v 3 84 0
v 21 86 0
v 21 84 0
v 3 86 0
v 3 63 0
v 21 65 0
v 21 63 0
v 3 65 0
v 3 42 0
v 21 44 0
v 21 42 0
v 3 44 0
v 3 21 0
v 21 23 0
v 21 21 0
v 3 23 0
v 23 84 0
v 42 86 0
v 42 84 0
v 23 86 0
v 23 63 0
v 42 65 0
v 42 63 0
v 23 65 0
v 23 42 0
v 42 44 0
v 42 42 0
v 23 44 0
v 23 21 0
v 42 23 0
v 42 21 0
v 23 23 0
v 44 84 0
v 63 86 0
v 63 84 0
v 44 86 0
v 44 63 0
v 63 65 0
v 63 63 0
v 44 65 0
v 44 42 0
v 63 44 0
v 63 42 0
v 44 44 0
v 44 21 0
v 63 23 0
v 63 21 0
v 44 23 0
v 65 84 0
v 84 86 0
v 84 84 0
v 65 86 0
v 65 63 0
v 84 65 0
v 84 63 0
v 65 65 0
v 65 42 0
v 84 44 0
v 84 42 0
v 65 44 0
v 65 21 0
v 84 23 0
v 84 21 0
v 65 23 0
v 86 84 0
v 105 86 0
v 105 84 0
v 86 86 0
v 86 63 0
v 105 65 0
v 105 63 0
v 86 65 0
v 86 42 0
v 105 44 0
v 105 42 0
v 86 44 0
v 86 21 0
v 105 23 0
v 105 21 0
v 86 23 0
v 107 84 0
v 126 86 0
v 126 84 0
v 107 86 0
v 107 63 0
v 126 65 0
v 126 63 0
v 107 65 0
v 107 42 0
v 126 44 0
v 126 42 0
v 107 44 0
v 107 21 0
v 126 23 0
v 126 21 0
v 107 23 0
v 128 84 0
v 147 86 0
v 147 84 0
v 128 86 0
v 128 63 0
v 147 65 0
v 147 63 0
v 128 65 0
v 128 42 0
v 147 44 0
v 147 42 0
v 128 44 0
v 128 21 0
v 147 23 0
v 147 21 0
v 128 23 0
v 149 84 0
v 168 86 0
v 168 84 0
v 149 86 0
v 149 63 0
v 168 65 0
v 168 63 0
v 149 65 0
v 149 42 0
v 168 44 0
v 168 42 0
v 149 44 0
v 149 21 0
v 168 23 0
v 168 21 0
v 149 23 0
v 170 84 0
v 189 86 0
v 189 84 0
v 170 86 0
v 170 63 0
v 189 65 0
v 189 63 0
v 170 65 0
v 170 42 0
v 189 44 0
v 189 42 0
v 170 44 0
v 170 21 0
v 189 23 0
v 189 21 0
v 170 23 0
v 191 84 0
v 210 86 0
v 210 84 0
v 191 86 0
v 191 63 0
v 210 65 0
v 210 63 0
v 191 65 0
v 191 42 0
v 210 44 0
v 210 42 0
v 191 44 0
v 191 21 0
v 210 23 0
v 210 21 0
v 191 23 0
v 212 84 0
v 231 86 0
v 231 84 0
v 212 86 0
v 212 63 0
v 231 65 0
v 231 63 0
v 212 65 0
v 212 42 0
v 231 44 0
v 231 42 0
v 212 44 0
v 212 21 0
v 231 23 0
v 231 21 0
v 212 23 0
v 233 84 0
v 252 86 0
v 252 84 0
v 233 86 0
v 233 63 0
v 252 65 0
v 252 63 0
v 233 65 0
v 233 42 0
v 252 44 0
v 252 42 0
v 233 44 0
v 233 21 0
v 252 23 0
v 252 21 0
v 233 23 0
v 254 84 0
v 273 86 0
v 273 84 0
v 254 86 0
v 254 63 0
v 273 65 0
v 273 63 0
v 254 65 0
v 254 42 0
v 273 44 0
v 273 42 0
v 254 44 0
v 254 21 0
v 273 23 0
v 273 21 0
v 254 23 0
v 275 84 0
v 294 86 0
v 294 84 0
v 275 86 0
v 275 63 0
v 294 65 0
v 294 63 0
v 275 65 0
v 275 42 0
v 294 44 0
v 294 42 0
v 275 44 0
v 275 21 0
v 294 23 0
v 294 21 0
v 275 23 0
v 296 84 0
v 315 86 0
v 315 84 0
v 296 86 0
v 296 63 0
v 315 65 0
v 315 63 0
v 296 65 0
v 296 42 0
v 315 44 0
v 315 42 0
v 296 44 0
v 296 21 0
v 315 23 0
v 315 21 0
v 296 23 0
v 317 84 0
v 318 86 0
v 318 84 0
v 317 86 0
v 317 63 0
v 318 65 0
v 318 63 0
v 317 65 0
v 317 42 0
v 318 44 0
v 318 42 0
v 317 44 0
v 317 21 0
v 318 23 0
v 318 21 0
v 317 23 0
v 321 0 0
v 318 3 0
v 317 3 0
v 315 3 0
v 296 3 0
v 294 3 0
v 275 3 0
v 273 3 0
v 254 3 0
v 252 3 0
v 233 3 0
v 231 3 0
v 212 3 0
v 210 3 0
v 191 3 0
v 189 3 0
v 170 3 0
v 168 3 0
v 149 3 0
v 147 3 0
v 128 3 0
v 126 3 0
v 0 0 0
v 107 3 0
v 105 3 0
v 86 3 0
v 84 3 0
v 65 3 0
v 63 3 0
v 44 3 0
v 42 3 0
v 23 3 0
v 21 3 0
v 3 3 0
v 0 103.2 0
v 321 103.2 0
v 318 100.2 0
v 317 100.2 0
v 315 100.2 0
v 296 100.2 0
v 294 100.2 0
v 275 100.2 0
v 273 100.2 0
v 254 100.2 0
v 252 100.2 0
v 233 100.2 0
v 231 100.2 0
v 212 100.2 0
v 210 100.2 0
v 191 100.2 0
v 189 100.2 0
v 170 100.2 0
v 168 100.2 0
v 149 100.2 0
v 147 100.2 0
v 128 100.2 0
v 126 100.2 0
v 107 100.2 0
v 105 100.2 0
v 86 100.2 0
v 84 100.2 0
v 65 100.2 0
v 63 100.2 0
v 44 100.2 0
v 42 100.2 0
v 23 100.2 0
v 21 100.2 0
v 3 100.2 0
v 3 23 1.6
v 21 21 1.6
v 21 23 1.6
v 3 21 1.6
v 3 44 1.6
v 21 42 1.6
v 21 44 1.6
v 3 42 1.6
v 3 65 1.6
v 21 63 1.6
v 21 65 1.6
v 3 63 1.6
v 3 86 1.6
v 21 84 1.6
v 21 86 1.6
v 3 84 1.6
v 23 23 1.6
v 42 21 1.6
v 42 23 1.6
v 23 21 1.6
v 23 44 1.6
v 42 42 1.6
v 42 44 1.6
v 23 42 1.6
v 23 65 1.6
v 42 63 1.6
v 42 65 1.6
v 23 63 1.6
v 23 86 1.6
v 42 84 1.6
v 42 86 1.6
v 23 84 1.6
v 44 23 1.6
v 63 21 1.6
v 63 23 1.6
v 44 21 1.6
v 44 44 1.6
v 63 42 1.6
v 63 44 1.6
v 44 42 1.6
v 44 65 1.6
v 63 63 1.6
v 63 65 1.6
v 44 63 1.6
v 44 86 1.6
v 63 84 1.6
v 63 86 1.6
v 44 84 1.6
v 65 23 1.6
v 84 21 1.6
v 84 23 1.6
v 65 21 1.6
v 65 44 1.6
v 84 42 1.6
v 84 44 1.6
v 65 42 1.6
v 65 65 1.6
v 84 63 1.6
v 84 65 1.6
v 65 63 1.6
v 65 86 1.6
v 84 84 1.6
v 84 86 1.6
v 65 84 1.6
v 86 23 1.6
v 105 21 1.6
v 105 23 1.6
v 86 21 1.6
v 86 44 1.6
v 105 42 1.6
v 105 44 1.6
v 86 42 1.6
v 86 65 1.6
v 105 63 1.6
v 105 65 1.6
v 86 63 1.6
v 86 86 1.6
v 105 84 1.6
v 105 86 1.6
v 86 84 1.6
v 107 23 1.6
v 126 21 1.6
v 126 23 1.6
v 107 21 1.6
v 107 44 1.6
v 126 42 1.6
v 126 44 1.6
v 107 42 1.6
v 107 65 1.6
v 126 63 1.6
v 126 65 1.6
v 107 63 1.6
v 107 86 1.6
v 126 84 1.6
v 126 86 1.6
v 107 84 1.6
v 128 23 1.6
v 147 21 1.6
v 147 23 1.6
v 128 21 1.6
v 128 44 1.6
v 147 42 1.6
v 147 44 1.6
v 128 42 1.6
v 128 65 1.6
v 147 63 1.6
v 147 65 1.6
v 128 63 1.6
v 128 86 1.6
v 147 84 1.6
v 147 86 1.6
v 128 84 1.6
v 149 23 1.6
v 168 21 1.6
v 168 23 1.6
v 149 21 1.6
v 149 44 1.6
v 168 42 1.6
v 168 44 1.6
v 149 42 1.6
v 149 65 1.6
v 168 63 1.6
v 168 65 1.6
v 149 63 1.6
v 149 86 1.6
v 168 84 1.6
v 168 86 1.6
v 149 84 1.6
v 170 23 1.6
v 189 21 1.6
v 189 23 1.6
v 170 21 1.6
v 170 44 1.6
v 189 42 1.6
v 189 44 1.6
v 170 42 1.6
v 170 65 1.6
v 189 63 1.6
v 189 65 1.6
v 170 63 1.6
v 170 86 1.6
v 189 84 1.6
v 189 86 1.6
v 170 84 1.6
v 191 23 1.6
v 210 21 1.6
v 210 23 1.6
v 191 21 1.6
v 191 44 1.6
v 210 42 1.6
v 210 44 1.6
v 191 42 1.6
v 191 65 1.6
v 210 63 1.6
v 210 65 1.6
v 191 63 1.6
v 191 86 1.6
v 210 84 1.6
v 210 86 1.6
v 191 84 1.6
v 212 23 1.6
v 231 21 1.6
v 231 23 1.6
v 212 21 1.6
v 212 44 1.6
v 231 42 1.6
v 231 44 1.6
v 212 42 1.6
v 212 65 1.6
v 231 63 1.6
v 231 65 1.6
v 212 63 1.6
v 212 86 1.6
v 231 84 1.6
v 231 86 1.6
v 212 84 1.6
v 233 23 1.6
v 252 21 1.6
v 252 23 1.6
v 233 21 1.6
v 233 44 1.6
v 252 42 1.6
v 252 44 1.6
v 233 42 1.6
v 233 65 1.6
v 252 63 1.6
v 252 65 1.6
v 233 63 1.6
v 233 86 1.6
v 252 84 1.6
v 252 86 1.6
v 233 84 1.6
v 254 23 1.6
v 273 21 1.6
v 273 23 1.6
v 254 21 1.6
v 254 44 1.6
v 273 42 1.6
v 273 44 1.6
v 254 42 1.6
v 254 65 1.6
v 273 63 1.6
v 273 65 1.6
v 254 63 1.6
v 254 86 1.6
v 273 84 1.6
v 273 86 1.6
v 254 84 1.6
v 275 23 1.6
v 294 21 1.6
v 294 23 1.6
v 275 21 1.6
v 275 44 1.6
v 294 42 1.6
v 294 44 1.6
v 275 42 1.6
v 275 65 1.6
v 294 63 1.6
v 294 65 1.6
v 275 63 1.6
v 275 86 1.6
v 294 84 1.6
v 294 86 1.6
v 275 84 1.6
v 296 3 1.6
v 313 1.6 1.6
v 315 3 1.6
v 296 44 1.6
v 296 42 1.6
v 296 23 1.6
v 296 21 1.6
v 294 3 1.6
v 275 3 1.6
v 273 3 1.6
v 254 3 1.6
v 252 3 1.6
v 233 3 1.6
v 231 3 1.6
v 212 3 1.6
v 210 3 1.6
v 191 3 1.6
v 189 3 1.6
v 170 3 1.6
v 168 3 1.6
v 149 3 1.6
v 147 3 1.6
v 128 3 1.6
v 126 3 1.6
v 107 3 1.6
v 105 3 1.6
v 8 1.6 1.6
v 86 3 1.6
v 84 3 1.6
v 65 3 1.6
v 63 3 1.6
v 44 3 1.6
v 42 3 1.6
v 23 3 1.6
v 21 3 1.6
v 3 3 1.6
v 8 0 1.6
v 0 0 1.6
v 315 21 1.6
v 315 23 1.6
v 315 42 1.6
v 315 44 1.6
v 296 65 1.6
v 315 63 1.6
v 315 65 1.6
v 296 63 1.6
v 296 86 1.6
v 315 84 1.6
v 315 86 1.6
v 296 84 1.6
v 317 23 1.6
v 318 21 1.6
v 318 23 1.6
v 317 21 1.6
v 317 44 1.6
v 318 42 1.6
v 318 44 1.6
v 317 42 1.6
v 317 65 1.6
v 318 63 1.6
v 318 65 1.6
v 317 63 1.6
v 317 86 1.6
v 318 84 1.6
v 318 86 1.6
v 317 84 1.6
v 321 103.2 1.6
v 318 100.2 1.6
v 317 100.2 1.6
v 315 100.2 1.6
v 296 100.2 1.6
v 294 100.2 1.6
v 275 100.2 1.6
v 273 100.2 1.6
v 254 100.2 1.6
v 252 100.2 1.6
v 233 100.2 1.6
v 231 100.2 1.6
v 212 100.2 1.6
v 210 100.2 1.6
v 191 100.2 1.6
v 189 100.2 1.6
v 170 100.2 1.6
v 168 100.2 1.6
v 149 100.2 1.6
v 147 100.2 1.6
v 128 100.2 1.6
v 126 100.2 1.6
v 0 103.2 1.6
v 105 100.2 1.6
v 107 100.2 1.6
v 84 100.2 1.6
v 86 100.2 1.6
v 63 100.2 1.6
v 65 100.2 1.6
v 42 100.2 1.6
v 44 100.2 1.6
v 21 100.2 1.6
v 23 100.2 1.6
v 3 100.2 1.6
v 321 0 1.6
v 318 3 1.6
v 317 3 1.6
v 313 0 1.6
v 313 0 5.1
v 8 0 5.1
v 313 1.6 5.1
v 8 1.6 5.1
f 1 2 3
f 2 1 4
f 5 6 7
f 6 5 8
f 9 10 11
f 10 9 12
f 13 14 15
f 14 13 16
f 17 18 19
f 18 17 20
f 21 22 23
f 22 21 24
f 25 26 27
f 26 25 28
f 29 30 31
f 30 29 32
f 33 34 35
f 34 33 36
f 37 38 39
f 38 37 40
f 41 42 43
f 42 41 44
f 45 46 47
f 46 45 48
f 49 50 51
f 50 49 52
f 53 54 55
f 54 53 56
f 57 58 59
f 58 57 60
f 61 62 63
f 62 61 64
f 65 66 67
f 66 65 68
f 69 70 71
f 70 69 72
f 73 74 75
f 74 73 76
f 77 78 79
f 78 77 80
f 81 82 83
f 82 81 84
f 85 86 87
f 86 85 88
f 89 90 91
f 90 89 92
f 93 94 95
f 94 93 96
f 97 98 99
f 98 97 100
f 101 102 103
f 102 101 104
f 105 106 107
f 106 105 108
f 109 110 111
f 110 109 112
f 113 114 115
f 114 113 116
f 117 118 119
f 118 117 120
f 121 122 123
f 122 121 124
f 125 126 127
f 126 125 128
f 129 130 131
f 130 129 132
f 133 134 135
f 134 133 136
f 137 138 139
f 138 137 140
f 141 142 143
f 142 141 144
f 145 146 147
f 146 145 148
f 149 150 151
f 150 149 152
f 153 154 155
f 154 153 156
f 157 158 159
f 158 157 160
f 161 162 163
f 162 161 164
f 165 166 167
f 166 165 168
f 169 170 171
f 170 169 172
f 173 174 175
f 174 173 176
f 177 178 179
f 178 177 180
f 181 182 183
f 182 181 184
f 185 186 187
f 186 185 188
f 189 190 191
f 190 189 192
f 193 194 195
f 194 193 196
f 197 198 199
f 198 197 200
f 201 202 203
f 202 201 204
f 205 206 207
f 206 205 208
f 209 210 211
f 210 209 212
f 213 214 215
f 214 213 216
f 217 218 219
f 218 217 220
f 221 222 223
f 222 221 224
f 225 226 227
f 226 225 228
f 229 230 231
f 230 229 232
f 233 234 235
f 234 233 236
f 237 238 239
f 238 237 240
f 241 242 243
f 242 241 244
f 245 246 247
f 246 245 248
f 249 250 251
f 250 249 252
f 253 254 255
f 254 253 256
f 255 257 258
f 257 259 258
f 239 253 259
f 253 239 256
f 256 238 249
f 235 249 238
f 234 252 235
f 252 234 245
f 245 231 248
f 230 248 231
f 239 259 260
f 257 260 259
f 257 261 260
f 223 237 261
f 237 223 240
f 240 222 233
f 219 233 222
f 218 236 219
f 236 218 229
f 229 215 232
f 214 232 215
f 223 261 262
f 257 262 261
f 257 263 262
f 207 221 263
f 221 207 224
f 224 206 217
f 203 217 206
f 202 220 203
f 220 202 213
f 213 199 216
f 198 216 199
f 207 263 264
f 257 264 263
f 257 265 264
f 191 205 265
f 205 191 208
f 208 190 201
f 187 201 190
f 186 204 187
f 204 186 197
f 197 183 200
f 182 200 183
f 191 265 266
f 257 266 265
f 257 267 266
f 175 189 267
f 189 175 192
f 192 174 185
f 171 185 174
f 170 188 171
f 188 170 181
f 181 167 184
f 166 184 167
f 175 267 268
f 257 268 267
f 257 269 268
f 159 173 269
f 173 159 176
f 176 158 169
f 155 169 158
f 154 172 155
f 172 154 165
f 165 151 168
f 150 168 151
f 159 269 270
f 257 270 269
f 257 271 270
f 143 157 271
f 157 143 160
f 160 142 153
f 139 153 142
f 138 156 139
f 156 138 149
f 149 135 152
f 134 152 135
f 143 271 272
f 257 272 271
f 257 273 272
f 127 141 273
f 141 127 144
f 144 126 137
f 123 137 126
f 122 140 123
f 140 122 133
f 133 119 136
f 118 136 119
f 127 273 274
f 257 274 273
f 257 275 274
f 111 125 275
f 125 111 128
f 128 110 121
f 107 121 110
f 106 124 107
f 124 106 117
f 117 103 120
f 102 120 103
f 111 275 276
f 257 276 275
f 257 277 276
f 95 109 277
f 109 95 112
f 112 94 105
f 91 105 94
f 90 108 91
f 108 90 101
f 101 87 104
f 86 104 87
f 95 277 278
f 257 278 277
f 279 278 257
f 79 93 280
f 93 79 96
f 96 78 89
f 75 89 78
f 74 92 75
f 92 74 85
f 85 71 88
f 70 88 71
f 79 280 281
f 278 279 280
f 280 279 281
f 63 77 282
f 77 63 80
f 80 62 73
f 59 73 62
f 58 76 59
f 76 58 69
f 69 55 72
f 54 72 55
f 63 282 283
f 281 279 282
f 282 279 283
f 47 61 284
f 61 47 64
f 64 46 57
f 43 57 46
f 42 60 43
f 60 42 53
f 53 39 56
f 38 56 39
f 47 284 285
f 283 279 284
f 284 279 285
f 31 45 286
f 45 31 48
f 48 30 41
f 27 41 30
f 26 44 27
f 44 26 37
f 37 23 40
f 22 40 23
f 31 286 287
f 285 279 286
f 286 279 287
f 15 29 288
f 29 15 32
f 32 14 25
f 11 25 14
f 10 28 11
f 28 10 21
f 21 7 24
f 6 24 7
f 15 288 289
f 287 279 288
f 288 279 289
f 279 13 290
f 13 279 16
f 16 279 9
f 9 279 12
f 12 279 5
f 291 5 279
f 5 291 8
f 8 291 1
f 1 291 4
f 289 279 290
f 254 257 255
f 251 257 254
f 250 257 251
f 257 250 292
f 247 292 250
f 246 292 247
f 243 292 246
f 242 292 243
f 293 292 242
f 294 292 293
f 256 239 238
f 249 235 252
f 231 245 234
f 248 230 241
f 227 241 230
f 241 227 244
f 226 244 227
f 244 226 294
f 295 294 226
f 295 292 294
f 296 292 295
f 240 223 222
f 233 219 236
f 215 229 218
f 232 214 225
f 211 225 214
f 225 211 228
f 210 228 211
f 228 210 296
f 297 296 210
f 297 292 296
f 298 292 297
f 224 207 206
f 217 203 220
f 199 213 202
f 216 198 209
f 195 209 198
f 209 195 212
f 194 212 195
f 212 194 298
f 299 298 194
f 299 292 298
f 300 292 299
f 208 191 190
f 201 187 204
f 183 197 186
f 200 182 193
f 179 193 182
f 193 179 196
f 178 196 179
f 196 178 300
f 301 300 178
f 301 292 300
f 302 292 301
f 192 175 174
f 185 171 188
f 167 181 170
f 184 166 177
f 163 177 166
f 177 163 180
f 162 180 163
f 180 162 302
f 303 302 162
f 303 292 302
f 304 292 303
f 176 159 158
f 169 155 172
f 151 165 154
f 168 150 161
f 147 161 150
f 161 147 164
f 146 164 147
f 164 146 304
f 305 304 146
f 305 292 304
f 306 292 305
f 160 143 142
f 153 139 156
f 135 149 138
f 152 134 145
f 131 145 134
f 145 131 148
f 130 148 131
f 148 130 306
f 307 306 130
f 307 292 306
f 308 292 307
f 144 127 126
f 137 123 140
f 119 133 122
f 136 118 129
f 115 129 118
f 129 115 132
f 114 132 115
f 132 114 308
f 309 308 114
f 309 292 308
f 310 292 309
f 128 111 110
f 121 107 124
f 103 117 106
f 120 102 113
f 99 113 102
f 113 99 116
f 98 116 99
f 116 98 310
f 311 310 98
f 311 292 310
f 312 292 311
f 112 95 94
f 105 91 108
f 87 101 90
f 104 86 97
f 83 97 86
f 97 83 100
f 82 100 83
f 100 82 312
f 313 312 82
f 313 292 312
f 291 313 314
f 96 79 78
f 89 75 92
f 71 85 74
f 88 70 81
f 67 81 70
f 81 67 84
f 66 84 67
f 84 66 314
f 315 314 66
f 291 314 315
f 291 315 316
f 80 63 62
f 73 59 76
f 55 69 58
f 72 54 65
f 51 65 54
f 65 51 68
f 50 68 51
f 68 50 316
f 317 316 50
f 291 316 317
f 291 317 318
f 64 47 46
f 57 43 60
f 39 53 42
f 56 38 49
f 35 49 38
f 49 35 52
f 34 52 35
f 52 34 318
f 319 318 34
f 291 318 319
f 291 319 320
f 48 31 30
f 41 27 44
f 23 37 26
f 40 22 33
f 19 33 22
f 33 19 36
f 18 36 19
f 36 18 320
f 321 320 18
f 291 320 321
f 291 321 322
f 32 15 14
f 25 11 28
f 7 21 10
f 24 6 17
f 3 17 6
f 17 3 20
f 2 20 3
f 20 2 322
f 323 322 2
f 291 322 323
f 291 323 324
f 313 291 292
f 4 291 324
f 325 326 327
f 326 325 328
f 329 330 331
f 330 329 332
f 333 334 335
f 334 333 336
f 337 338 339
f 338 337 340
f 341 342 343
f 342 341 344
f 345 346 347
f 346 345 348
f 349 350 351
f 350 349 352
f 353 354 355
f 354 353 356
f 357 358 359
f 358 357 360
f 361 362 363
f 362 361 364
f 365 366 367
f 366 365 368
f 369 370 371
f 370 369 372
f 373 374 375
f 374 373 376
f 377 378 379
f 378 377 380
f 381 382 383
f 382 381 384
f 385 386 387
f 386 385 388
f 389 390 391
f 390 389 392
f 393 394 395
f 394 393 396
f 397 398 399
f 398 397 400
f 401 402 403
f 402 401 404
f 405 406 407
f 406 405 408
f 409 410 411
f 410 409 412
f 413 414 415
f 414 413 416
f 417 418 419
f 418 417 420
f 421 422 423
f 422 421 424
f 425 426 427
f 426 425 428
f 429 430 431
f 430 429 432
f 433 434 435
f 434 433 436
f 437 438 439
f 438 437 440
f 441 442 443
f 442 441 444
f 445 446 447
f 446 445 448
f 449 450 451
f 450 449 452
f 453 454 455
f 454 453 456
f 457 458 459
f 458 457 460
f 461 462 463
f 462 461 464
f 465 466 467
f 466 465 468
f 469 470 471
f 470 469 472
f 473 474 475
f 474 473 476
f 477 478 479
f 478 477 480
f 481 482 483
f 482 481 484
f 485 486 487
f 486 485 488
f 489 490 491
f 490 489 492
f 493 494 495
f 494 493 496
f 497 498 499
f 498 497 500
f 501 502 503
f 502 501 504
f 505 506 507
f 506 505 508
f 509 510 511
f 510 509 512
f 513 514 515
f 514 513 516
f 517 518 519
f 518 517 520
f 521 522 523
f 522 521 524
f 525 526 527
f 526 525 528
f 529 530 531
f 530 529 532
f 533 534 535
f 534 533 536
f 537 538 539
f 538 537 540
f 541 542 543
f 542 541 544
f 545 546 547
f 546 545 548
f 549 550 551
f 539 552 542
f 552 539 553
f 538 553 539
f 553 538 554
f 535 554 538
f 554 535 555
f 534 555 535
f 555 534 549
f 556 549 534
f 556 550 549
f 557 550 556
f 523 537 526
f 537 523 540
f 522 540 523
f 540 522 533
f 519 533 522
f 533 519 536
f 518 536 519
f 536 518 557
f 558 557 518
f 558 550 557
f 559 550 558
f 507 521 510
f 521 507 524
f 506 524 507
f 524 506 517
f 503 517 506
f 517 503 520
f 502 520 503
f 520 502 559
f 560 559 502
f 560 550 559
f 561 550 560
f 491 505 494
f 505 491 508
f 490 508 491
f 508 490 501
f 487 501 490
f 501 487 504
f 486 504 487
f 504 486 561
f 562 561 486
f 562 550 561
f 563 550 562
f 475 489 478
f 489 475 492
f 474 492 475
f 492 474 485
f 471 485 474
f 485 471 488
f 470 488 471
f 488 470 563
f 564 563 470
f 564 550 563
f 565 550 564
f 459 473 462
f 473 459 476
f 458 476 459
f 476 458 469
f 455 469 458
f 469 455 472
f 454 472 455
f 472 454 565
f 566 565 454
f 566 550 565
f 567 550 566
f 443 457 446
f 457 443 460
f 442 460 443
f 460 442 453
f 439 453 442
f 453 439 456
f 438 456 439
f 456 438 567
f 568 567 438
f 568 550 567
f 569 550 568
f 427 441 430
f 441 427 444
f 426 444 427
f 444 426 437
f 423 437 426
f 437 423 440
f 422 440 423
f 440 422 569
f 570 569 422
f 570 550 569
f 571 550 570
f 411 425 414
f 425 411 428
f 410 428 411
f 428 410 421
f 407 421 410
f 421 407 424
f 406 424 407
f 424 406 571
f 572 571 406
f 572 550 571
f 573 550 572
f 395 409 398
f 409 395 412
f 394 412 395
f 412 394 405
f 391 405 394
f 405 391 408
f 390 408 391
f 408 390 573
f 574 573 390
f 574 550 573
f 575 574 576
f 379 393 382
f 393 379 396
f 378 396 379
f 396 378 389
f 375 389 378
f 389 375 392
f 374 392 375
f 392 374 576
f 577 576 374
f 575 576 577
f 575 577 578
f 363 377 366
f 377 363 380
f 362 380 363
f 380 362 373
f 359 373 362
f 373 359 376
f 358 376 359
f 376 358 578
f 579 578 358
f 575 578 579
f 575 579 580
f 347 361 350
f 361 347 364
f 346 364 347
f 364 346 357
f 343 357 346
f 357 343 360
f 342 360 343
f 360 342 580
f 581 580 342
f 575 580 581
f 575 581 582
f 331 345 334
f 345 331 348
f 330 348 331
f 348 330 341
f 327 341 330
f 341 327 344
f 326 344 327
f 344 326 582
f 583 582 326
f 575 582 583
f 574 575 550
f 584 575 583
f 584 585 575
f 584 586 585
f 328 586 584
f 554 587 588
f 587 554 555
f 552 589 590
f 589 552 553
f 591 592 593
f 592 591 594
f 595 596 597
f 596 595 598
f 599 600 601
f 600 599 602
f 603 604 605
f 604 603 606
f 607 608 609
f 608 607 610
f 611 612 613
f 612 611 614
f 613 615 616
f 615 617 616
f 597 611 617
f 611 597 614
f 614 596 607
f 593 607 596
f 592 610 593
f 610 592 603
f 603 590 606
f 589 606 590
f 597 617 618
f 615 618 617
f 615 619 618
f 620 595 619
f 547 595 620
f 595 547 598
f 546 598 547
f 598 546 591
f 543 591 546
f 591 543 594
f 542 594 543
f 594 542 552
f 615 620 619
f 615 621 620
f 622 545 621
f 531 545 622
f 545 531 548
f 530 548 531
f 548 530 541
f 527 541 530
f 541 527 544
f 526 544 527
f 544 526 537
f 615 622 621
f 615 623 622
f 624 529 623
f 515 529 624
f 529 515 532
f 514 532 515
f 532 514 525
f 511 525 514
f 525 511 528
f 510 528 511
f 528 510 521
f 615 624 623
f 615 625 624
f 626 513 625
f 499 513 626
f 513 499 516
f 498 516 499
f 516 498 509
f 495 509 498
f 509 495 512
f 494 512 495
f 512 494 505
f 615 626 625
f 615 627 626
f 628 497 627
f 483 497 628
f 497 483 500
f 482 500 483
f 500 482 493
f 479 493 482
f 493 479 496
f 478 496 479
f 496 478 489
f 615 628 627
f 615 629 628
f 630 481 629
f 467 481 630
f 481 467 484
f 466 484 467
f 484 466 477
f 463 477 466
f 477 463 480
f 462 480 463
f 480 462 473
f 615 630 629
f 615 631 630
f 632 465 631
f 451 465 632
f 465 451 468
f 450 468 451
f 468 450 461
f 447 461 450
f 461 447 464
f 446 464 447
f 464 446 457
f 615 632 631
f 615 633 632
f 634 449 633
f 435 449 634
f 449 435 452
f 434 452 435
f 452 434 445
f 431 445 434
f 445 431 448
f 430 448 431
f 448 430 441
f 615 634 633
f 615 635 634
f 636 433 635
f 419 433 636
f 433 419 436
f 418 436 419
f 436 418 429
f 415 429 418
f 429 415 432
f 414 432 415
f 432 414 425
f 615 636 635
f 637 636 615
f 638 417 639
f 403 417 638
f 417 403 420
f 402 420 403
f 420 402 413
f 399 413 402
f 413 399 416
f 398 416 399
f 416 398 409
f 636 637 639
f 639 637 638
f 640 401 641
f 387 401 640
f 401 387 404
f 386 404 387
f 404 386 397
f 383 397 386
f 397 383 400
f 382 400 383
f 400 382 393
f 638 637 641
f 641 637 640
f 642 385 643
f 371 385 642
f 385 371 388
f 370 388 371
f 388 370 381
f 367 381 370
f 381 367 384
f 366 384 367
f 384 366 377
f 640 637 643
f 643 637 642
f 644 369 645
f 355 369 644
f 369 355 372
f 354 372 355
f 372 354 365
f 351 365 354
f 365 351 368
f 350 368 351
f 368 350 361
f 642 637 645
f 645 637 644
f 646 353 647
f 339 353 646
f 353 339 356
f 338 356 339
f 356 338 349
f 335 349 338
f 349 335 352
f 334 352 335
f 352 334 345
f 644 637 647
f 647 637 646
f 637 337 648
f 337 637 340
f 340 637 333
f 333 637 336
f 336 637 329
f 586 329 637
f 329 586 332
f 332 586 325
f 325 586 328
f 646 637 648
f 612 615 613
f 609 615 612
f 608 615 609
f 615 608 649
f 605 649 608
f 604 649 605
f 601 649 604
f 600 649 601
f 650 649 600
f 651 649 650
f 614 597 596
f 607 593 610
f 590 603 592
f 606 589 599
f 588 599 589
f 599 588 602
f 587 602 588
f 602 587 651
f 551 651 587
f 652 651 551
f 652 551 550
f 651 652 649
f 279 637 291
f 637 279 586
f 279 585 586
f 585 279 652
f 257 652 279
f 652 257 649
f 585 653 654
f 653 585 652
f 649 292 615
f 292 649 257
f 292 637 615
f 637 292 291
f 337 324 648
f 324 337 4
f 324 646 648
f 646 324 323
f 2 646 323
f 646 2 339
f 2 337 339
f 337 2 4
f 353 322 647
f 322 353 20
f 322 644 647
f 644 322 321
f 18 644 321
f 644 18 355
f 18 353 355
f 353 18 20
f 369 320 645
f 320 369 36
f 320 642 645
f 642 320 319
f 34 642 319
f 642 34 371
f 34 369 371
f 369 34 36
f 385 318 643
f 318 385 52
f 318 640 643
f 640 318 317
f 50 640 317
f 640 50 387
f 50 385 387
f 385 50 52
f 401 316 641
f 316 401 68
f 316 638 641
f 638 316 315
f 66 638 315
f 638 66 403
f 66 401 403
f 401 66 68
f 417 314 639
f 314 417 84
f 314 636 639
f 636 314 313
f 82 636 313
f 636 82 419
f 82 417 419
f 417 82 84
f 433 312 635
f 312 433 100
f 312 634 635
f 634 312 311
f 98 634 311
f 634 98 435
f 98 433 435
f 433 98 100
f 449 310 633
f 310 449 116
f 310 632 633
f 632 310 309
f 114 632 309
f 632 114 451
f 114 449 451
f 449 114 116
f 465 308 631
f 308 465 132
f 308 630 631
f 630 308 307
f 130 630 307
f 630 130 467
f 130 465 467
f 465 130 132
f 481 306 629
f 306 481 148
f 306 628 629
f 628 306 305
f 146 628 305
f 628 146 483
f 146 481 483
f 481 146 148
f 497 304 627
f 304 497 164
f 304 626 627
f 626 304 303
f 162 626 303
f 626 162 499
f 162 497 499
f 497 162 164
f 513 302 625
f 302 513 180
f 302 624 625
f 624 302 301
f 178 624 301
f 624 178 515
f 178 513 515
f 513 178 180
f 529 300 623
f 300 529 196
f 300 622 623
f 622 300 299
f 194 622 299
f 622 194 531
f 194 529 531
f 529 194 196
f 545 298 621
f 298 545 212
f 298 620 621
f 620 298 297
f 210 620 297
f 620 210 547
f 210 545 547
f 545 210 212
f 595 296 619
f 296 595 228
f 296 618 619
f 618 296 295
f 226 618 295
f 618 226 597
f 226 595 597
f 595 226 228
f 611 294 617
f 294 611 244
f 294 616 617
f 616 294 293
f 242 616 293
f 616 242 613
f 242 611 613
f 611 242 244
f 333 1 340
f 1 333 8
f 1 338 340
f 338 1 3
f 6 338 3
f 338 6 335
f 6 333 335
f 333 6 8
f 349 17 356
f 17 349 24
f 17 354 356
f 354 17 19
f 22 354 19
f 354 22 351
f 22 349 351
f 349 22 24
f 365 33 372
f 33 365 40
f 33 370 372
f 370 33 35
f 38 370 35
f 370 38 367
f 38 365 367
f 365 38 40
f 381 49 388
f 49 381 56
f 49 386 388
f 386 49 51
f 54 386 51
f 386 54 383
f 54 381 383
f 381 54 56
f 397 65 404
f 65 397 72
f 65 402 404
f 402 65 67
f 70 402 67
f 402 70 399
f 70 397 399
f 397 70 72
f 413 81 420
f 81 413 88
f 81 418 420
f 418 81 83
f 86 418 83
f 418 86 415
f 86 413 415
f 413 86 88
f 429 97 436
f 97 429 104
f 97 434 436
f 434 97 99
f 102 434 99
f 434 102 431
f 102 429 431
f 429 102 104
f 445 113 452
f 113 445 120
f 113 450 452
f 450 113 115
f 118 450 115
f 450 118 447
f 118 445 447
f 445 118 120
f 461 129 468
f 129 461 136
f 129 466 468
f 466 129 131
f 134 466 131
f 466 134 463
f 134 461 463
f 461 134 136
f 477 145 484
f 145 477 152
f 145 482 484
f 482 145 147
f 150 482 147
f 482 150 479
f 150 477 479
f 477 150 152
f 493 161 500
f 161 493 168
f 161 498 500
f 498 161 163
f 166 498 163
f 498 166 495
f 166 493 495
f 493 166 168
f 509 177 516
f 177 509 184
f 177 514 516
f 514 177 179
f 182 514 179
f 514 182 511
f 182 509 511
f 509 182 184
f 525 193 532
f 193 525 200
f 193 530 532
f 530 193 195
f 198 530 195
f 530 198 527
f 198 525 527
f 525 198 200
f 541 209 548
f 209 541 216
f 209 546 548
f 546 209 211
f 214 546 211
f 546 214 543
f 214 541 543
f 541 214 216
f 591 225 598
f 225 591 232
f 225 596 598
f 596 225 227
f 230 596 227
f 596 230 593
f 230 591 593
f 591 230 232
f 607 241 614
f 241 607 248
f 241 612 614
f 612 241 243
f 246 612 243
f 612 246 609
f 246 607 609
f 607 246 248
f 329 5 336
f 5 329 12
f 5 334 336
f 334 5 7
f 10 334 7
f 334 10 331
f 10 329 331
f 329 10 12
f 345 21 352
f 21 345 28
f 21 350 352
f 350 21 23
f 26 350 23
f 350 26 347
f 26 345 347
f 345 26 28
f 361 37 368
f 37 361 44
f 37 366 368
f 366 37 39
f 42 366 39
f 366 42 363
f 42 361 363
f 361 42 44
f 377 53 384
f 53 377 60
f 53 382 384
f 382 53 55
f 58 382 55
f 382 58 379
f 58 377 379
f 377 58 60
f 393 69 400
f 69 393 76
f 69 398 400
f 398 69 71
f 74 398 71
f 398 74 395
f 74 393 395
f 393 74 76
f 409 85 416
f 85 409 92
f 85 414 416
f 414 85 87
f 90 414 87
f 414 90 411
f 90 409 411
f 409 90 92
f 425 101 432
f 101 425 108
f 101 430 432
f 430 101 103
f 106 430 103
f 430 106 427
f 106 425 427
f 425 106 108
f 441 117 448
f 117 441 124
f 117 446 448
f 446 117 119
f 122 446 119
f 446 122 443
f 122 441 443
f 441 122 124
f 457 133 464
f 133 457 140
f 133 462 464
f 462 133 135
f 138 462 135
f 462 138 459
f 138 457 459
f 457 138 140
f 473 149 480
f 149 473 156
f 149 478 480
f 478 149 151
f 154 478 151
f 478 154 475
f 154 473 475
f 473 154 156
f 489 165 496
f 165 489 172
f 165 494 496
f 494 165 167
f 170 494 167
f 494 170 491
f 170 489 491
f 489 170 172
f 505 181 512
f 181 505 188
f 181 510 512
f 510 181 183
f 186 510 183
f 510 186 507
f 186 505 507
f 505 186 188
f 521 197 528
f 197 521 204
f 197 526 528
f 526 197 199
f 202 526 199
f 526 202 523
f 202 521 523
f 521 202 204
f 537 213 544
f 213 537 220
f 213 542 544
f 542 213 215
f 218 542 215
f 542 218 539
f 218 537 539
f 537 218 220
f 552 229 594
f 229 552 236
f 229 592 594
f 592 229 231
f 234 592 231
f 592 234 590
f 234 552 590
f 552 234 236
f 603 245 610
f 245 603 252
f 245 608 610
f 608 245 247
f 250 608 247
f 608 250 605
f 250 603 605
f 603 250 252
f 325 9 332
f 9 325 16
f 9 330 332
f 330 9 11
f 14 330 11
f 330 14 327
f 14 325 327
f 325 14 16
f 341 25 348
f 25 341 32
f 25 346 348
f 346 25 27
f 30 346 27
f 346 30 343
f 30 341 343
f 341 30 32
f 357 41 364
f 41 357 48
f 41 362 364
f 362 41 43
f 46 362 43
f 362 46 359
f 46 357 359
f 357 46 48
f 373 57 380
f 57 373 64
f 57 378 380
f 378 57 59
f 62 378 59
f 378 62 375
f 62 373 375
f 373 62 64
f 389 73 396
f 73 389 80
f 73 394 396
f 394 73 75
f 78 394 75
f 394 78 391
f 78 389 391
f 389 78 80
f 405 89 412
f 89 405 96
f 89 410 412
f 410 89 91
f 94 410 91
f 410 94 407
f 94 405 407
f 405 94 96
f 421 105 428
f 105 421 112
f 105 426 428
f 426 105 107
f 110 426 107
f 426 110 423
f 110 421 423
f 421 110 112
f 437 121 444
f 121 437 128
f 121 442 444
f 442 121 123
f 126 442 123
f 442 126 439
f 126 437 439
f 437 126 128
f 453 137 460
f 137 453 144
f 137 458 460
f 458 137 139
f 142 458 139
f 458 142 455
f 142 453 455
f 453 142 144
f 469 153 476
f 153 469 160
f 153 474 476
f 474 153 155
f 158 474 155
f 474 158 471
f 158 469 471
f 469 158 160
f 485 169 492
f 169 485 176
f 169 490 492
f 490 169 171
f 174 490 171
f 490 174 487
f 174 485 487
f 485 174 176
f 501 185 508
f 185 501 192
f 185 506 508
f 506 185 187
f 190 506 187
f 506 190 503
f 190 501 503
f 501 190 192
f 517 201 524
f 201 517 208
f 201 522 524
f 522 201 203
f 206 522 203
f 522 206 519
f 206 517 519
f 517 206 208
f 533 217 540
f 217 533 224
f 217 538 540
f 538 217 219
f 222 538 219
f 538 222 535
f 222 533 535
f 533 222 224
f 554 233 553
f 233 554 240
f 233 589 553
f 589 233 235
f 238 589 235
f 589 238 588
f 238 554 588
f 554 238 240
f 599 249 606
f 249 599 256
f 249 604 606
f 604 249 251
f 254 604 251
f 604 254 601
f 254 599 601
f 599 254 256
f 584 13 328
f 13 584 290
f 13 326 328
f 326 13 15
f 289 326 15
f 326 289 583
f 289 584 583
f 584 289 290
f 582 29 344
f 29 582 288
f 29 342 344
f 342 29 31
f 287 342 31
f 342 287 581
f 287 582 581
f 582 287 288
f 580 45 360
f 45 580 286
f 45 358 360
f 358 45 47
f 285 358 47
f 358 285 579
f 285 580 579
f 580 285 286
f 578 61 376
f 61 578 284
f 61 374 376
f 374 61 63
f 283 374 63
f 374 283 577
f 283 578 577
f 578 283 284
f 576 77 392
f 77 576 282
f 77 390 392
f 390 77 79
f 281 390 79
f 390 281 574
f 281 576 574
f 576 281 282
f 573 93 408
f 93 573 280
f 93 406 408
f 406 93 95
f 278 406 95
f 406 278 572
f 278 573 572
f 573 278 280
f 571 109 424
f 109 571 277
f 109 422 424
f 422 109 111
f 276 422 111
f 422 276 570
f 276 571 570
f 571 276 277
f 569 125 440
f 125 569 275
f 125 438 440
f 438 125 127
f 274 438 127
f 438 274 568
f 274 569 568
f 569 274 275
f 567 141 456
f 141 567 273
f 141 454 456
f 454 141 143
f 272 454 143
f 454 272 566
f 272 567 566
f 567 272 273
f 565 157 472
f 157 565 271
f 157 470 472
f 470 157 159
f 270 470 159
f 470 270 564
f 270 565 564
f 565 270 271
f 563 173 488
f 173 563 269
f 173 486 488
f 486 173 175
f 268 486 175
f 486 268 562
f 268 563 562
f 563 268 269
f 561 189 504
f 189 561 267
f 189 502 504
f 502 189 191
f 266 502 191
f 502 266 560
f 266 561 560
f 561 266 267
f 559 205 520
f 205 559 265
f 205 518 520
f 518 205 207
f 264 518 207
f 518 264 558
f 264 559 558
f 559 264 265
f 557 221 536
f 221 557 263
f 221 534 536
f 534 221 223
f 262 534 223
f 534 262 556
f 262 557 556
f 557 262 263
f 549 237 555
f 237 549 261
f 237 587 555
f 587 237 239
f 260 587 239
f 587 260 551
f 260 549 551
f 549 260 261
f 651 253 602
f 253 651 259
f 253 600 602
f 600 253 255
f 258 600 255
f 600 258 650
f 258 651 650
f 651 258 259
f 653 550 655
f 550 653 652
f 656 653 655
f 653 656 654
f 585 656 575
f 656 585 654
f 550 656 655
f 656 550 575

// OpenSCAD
// GetCigar v1.1 | printed FLAT panels, support-free in specified orientation
part="side"; // side front back bottom post runner guide runner_test guide_test divider
$fn=24;
IW=120; ID=320; IH=100; wall=1.6; floorT=1.6;
P=8.6; slot=2; slotDepth=4; H=IH+2*floorT;
W=IW+P+wall; D=ID+P+wall;
panelW=W-2*(P-slotDepth); panelD=D-2*(P-slotDepth);
module lattice2d(w,h,spacing=20,bar=2){
  square([w,3]); translate([0,h-3])square([w,3]);
  square([3,h]); translate([w-3,0])square([3,h]);
  for(x=[spacing:spacing:w-6])translate([x,0])square([bar,h]);
  for(y=[spacing:spacing:h-6])translate([0,y])square([w,bar]);
}
module side(){
  linear_extrude(wall)lattice2d(panelD,H,21,2);
  translate([8,0,wall])cube([panelD-16,floorT,3.5]);
}
module front(){
  linear_extrude(wall){
    square([panelW,76]);
    translate([0,76])lattice2d(panelW,H-76,20,2);
  }
}
module back(){linear_extrude(wall)lattice2d(panelW,H,19,2);}
module bottom(){
  w=IW-0.8; d=ID-0.8;
  linear_extrude(floorT)lattice2d(w,d,17,2);
  for(x=[1.0,w-10])translate([x,0,0])cube([9,d,2.4]);
}
module post(){
  difference(){
    cube([P,P,H]);
    translate([P/2-slot/2,P-slotDepth,-0.1])
      cube([slot,slotDepth+0.1,H+0.2]);
    translate([P-slotDepth,P/2-slot/2,-0.1])
      cube([slotDepth+0.1,slot,H+0.2]);
  }
}
runnerW=9; runnerH=3.5; runnerLen=315;
guideSlotW=9.8; guideWall=2; guideBase=2.2; guideH=6; guideLen=309;
module runner(len=runnerLen){
  difference(){
    cube([runnerW,len,runnerH]);
    for(y=[22,154,286])if(y<len-4)
      translate([runnerW/2,y,-0.1])cylinder(d=3.3,h=runnerH+0.2);
  }
}
module guide(len=guideLen){
  cube([guideSlotW+2*guideWall,len,guideBase]);
  cube([guideWall,len,guideH]);
  translate([guideSlotW+guideWall,0,0])cube([guideWall,len,guideH]);
}
module divider(){linear_extrude(1.6)lattice2d(IW-1,IH-8,18,2);}
if(part=="side")side();
else if(part=="front")front();
else if(part=="back")back();
else if(part=="bottom")bottom();
else if(part=="post")post();
else if(part=="runner")runner();
else if(part=="guide")guide();
else if(part=="runner_test")runner(55);
else if(part=="guide_test")guide(65);
else if(part=="divider")divider();
